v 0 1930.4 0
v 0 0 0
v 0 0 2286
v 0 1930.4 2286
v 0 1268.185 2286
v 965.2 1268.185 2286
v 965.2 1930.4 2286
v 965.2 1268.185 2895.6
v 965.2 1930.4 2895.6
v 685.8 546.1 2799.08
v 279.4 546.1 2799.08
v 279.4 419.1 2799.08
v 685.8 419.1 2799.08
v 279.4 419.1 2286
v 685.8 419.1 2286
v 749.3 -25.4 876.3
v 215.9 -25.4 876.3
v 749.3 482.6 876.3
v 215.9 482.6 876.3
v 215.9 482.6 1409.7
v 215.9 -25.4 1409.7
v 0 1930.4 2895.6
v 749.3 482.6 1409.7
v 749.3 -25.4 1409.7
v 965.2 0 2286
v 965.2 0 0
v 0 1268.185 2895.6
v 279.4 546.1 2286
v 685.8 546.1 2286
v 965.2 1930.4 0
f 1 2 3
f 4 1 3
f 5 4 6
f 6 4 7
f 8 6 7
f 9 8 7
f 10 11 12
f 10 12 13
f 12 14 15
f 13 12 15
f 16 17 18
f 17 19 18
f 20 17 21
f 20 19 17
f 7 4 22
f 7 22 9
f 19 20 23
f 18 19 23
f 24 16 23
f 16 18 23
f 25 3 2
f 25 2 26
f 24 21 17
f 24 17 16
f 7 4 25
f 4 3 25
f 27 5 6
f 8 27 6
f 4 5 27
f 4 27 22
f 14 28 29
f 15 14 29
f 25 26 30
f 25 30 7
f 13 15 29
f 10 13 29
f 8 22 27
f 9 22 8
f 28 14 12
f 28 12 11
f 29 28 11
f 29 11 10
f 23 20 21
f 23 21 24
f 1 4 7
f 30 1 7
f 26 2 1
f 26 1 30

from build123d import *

# Parameters (mm, degrees)
F0_W      = 965.2
F0_H      = 2286
F1_DEPTH  = 965.2
F2_DEPTH  = 965.2
F3_W      = 406.4
F3_H      = 127
F4_DEPTH  = 513.08
F5_W      = 533.4
F5_H      = 533.4
F6_DEPTH  = 482.6
F7_DEPTH  = 25.4
F9_W      = 965.2
F9_H      = 662.2150997162
F10_DEPTH = 609.6


with BuildPart() as f1:
    # F0 (on Front) → F1 (new body)
    with BuildSketch(Plane.XZ):
        with Locations((482.6, 1143)):
            Rectangle(F0_W, F0_H)
    extrude(amount=-F1_DEPTH)


with BuildPart() as f2:
    # F2 (new): a face of the model
    f2_faces = [f1.part.faces().sort_by_distance(p)[0] for p in [
        (482.6, 965.2, 1143),
    ]]
    extrude(f2_faces, amount=F2_DEPTH)


with BuildPart() as f4:
    # F3 (on face) → F4 (new body)
    with BuildSketch(Plane.XY.offset(2286)):
        with Locations((482.6, 482.6)):
            Rectangle(F3_W, F3_H)
    extrude(amount=F4_DEPTH)


with BuildPart() as f6:
    # F5 (on Front) → F6 (new body)
    with BuildSketch(Plane.XZ):
        with Locations((482.6, 1143)):
            Rectangle(F5_W, F5_H)
    extrude(amount=-F6_DEPTH)

    # F5 (on Front) → F7 (join)
    with BuildSketch(Plane.XZ):
        with Locations((482.6, 1143)):
            Rectangle(F5_W, F5_H)
    extrude(amount=F7_DEPTH)


with BuildPart() as f1_1:
    add(f1.part)

    # F8: union F2
    add(f2.part)


with BuildPart() as f10:
    # F9 (on face) → F10 (new body)
    with BuildSketch(Plane.XY.offset(2286)):
        with Locations((482.6, 1599.2924501419)):
            Rectangle(F9_W, F9_H)
    extrude(amount=F10_DEPTH)


solid = Compound([f4.part, f6.part, f1_1.part, f10.part])
